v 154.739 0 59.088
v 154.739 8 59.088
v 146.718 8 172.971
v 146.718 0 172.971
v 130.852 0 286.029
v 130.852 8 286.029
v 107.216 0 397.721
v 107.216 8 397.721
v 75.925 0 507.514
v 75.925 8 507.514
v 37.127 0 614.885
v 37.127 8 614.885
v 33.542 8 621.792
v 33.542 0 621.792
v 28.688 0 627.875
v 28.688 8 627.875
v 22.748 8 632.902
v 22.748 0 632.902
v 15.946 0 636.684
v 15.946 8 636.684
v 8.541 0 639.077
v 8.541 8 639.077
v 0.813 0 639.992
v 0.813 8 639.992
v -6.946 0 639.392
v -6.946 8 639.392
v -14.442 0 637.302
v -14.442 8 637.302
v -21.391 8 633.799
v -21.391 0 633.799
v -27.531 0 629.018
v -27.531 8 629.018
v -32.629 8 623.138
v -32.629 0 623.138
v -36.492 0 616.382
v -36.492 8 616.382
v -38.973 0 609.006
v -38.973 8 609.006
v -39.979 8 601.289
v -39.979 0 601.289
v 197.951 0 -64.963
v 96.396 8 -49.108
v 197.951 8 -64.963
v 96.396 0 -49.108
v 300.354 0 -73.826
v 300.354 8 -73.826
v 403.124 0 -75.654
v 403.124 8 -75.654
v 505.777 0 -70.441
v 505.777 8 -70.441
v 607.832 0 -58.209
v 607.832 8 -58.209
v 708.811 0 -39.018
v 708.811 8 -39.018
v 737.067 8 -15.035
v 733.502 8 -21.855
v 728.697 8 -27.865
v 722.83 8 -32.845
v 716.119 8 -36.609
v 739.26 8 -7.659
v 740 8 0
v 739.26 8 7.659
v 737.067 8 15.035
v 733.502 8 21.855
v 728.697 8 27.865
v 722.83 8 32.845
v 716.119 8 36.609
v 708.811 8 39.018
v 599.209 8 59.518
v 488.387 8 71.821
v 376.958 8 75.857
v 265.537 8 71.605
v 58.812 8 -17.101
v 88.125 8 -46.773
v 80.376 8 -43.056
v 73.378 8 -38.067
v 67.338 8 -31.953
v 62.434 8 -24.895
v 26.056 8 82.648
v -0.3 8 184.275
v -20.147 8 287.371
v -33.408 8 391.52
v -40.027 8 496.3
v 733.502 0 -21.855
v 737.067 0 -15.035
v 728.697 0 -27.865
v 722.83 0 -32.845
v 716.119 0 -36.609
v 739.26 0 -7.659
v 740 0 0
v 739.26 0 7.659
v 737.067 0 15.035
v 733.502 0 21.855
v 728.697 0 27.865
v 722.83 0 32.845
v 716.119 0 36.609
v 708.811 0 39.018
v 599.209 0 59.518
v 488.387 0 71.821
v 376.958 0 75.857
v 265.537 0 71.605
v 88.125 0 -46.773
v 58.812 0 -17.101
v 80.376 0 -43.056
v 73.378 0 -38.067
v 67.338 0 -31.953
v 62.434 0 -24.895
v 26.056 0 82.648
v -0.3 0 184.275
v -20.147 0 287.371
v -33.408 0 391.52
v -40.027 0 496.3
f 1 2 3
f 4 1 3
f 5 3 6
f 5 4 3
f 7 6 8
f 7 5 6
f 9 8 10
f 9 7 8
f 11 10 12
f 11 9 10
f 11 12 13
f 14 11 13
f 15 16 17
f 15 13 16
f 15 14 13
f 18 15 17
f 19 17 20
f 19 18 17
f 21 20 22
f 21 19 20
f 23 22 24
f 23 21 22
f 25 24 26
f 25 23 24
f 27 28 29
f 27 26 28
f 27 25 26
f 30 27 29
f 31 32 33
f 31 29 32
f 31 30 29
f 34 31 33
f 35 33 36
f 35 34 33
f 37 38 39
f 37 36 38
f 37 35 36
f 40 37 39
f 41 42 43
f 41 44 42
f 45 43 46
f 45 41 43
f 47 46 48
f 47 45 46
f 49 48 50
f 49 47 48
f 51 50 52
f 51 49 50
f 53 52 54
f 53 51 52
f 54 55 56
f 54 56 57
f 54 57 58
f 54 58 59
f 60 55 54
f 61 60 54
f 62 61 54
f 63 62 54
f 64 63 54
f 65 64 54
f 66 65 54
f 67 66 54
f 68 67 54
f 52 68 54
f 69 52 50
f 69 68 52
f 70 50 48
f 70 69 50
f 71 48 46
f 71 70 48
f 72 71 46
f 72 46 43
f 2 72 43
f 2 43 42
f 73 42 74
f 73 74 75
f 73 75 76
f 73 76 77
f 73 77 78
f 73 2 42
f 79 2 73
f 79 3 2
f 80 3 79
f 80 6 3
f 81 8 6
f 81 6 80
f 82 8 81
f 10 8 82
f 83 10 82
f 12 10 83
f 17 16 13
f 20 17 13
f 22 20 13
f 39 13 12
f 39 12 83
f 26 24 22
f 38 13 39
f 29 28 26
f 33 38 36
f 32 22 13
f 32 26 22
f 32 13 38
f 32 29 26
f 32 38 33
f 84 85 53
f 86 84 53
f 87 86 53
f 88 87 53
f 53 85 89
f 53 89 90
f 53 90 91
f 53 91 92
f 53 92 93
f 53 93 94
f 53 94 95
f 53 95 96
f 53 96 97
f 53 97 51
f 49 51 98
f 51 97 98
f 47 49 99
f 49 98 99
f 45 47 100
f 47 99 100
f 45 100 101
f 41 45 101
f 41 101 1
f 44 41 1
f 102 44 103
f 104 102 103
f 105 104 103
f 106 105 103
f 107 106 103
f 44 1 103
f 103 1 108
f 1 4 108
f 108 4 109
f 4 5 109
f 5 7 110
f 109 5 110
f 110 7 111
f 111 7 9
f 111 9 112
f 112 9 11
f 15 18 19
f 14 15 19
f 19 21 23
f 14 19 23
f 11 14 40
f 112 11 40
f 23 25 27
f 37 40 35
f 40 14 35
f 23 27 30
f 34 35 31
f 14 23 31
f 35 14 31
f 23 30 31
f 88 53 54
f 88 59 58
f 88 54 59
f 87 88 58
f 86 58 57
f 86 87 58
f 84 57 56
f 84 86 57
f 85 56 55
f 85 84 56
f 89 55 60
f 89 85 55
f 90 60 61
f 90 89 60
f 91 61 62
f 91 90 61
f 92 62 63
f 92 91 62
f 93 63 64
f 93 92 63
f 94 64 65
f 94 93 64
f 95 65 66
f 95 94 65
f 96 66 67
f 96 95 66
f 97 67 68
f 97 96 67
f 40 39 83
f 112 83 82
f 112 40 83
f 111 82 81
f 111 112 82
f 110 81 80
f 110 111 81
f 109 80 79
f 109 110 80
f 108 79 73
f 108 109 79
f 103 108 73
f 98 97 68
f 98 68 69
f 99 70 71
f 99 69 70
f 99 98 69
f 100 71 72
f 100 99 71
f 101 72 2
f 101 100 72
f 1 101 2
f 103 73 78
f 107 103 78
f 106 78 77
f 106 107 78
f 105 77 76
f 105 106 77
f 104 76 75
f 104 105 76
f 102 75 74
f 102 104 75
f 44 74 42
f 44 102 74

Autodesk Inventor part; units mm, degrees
ref_plane "YZ Plane" through (0, 0, 0) normal (1, 0, 0) x (0, 1, 0)
ref_plane "XZ Plane" through (0, 0, 0) normal (0, 1, 0) x (-1, 0, 0)
ref_plane "XY Plane" through (0, 0, 0) normal (0, 0, 1) x (1, 0, 0)
sketch "Sketch1" plane through (0, 0, 0) normal (0, 1, 0) x (-1, 0, 0)
  line L0 (0, 0) -> (-700, 0) construction
  line L1 (-700, 0) -> (-700, 600) construction
  line L2 (-700, 600) -> (0, 600) construction
  line L3 (0, 600) -> (0, 0) construction
  circle A0 centre (0, 600) radius 40
  line L4 (0, 600) -> (-105.7962, 0) construction
  circle A1 centre (-105.7962, 0) radius 50
  line L5 (1496.5572, 0) -> (-37.1273, 614.8851) construction
  circle A2 centre (-700, 0) radius 40
  circle A3 centre (-1611.5159, 548.0371) radius 1652.3534 construction
  line L6 (-1611.5159, 548.0371) -> (-58.8116, -17.101) construction
  line L7 (-1611.5159, 548.0371) -> (39.9792, 601.2891) construction
  line L8 (1496.5572, 0) -> (-1611.5159, 548.0371) construction
  line L9 (1496.5572, 0) -> (-155.7962, 0) construction
  arc A4 (-58.8116, -17.101) -> (39.9792, 601.2891) centre (-1611.5159, 548.0371) ccw
  arc A5 (-37.1273, 614.8851) -> (-155.7962, 0) centre (1496.5572, 0) ccw
  line L10 (-378.4115, -1424.1422) -> (-96.3957, 49.1084) construction
  line L11 (-708.8106, 39.0176) -> (-378.4115, -1424.1422) construction
  arc A6 (-708.8106, -39.0176) -> (-96.3957, -49.1084) centre (-378.4115, 1424.1422) ccw
  arc A7 (92.5652, 0) -> (-849.3883, 0) centre (-378.4115, 1424.1422) ccw construction
  arc A8 (-849.3883, 0) -> (0, 27.3415) centre (-378.4115, -1424.1422) ccw construction
  arc A9 (-40.1065, 37.2099) -> (-708.8106, 39.0176) centre (-378.4115, -1424.1422) ccw
  point P0 (-106.0172, 49.9995)
  point P1 (-701.1693, 39.9829)
  point P2 (-106.0172, -49.9995)
  point P3 (-701.1693, -39.9829)
  dimension "d0" = 700
  dimension "d1" = 600
  dimension "d3" = 80
  dimension "d5" = 10
  dimension "d7" = 100
  dimension "d9" = 80
extrude "Extrusion2" add sketch "Sketch1" along normal blind 8
properties part number "side"
